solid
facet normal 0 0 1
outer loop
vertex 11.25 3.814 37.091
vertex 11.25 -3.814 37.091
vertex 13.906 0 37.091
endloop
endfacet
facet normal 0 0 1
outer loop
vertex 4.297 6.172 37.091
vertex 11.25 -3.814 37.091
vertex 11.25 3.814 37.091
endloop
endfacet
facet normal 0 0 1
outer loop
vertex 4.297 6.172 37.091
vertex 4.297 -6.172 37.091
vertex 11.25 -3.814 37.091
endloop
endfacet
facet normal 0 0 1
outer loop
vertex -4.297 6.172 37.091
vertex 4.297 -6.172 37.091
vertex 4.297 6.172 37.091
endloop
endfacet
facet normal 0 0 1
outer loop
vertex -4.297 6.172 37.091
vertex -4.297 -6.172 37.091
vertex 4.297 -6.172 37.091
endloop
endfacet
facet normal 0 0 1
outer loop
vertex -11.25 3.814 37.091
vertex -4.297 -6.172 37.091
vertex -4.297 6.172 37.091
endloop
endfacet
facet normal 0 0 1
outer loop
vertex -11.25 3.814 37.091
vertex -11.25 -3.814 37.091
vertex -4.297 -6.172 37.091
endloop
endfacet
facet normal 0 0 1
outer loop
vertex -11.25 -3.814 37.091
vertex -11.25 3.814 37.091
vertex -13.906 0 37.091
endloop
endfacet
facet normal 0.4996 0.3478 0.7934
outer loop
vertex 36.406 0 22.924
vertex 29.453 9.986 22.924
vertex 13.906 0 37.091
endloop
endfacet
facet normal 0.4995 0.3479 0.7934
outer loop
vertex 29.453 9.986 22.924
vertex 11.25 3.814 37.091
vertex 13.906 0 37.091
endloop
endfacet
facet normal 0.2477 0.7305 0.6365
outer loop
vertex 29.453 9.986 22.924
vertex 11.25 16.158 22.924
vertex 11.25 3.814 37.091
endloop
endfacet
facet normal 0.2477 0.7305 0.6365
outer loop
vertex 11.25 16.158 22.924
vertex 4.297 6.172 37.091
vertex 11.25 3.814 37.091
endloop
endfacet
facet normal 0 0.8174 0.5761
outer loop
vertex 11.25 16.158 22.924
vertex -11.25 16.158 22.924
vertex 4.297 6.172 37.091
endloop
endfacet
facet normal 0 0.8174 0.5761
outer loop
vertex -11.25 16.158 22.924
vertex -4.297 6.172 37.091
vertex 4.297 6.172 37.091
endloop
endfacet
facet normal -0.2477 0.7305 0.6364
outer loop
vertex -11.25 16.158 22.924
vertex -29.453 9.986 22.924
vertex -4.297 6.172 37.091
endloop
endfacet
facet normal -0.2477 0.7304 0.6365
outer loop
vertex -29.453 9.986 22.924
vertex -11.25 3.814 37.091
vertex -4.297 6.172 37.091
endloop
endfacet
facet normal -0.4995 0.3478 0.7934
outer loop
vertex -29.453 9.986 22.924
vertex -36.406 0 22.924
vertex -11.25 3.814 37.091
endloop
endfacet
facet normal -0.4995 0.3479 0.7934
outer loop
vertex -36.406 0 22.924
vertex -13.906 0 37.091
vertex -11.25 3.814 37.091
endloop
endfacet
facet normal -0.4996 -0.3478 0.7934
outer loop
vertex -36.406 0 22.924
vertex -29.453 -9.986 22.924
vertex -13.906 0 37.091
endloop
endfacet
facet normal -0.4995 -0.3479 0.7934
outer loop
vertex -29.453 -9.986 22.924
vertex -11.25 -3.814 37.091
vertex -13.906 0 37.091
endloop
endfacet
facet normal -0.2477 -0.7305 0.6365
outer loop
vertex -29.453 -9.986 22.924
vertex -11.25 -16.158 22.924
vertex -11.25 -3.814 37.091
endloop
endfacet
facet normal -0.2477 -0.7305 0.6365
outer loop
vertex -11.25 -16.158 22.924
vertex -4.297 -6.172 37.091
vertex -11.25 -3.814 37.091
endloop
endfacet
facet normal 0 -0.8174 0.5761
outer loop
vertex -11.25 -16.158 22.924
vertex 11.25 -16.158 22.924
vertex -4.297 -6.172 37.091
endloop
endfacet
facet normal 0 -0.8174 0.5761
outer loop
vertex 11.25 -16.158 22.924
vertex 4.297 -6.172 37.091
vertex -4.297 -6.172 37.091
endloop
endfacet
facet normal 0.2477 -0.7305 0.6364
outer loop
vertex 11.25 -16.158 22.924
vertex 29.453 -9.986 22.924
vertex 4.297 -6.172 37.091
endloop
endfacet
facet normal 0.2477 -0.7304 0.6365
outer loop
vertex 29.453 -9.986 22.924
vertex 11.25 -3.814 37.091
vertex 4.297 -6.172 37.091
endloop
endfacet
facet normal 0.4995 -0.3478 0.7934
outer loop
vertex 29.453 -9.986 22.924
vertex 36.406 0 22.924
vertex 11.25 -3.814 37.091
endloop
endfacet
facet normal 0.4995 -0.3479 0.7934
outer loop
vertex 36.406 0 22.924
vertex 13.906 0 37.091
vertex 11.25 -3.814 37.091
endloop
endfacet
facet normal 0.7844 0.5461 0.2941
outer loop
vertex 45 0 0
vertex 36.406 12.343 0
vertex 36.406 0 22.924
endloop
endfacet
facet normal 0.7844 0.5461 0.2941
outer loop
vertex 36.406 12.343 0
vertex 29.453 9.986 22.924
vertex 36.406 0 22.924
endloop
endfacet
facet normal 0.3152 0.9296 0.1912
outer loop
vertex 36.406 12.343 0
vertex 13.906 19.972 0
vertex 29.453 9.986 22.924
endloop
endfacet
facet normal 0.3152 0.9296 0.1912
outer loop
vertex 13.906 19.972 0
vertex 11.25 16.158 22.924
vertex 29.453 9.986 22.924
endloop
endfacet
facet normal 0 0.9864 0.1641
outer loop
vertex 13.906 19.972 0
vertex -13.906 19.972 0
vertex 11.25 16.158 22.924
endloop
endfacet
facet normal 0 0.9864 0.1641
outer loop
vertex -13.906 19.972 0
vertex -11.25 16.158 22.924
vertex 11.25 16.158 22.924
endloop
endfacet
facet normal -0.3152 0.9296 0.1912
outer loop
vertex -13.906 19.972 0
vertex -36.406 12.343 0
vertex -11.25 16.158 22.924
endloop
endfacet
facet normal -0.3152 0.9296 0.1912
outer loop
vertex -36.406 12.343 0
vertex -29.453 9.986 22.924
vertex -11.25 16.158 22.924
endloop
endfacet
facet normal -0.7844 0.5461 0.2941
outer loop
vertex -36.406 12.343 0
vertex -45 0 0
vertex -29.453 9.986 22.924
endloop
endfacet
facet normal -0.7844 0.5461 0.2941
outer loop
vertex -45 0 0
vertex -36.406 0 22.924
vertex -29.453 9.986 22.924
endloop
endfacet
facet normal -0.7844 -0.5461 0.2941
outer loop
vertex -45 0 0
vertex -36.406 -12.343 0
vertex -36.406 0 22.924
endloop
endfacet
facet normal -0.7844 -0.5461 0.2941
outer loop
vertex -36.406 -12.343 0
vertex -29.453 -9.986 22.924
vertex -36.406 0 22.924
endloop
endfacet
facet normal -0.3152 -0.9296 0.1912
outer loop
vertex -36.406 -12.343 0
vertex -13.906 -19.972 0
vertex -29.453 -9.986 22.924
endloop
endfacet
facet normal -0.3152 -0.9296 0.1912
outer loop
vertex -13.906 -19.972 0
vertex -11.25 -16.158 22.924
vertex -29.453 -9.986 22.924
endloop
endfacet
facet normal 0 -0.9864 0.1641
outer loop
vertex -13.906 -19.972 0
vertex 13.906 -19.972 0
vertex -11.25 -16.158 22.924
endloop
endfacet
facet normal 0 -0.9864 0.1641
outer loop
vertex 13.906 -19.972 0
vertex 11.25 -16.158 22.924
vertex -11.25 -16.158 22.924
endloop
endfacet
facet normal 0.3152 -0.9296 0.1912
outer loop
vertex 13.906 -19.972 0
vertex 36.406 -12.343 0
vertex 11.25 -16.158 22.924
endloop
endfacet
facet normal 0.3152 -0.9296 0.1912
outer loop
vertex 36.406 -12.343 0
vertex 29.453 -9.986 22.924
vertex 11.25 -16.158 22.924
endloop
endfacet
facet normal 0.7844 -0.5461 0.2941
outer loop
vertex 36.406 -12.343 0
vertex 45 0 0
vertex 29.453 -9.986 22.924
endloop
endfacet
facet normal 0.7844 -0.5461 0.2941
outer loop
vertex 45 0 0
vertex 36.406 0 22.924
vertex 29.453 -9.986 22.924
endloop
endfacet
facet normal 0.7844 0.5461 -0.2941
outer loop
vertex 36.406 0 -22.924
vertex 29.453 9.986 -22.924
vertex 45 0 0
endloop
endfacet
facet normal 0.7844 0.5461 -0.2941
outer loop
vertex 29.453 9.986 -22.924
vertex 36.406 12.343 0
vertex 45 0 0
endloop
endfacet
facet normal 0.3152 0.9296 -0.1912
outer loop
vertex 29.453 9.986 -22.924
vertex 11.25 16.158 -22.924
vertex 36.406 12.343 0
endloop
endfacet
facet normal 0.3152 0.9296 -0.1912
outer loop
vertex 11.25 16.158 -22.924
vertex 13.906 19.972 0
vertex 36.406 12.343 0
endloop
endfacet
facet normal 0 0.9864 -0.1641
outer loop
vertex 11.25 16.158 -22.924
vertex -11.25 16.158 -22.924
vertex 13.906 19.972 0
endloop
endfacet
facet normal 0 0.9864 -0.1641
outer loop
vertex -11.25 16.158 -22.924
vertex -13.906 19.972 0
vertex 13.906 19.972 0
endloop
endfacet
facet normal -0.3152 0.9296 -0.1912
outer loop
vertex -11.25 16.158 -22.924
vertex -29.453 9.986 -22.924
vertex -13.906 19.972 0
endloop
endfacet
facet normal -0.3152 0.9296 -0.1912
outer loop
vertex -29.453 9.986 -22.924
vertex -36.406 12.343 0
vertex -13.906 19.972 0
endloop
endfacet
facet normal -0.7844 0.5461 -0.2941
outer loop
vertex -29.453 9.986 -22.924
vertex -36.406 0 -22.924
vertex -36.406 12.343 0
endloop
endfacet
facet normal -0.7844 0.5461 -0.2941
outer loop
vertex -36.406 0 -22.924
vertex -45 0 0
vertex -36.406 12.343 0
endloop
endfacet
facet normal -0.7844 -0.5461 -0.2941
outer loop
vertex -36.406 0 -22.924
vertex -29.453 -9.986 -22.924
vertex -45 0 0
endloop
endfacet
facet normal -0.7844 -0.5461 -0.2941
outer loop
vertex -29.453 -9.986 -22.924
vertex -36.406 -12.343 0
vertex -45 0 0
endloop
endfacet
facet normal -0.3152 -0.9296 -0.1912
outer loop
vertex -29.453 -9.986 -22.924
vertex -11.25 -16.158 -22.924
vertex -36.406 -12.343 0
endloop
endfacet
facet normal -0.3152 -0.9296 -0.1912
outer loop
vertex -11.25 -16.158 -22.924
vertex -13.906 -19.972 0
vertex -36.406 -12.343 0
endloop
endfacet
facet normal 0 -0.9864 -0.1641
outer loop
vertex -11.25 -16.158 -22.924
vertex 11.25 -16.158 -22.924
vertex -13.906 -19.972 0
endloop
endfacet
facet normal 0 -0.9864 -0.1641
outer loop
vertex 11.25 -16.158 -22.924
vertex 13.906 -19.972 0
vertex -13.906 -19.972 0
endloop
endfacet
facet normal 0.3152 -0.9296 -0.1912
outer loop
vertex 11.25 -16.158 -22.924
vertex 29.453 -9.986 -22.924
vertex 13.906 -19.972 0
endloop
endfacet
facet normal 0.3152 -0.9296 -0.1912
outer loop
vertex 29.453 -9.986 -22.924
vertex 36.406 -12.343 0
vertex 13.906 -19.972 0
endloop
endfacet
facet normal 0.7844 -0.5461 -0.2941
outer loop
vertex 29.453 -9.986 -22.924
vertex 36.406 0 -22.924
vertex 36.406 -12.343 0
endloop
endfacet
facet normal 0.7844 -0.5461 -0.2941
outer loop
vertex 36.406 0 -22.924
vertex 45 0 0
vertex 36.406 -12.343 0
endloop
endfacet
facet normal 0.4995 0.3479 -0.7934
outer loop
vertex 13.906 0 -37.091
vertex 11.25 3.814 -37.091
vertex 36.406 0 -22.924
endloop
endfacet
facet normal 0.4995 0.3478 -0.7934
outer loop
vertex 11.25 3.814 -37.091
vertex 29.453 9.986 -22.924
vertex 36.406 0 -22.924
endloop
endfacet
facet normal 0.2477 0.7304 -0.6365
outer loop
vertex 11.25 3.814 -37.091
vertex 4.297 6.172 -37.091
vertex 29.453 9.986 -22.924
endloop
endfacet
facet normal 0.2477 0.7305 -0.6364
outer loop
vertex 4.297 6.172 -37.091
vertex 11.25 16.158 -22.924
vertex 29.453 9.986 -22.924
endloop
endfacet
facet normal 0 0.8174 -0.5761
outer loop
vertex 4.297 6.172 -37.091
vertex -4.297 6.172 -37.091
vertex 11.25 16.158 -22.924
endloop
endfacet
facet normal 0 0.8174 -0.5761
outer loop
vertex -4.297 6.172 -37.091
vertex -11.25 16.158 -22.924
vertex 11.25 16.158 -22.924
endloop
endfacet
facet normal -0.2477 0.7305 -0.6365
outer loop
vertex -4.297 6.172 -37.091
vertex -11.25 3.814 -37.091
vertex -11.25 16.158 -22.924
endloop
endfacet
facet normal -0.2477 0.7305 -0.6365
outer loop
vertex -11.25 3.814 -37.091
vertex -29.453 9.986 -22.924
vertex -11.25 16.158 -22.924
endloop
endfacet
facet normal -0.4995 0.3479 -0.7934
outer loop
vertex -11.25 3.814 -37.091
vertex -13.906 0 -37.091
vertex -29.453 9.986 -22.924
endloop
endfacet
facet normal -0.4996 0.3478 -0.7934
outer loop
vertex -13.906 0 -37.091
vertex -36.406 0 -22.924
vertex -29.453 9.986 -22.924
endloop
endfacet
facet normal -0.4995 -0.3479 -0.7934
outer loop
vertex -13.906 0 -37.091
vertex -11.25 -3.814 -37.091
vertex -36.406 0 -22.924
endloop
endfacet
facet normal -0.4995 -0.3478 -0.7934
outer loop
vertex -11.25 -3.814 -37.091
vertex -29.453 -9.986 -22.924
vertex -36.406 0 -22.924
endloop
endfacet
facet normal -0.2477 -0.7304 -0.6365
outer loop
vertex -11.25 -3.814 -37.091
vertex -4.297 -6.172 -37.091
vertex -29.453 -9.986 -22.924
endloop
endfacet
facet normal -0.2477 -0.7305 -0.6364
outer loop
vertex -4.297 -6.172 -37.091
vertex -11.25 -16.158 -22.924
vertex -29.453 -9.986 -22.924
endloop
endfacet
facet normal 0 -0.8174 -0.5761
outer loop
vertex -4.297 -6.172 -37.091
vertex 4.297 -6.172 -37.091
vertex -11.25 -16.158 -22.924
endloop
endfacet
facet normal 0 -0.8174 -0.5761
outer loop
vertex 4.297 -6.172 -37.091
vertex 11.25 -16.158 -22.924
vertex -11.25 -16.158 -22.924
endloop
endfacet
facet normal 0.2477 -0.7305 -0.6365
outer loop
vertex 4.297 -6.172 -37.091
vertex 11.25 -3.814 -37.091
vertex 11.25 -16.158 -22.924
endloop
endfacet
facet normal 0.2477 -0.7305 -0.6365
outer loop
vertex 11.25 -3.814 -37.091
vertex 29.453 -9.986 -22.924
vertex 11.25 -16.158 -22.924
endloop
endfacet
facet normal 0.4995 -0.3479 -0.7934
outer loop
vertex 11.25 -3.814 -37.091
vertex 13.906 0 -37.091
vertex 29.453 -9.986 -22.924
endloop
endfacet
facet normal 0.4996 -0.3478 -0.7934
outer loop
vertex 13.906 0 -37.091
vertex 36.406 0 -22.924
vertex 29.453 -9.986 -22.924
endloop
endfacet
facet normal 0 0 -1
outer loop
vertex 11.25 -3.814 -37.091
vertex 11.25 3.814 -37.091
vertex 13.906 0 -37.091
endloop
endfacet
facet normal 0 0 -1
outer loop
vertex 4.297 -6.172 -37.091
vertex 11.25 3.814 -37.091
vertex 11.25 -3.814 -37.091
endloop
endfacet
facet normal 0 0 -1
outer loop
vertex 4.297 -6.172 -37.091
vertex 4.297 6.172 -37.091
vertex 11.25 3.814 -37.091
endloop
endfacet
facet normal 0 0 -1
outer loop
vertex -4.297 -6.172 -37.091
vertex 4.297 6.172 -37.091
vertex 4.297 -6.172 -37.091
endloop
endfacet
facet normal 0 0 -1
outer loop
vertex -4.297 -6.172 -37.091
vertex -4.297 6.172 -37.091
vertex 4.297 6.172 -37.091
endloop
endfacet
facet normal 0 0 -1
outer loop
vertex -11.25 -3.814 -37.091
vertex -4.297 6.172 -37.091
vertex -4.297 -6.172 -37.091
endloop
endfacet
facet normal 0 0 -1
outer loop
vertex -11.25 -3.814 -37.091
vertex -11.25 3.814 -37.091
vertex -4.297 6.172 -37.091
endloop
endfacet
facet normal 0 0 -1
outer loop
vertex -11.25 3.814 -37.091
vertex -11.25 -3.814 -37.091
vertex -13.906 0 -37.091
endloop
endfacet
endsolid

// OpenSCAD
// Generated by SolidPython 1.0.1 on 2020-07-29 00:46:51


scale(v = [15, 7, 13]) {
	sphere(r = 3);
}
/***********************************************
*********      SolidPython code:      **********
************************************************
 
# import packages: SolidPython
from solid import *
from solid.utils import *
from itertools import chain, combinations, permutations


class Resize:

    def __init__(self, scad_file):
        self.scad_file = scad_file
        #self.scad_file = import_scad(scad_file)
        # cone/cylinder param:
        self.r1 = 0
        self.r2 = 0
        self.h = 0
        # rectangular prism param:
        self.w = 0
        self.l = 0
        # ellipse param:
        self.r = 0

    # import OpenScad code (file name corresponds to shape)


    # classify shape + parameters
    def assign(self, param1, param2, param3):
        if self.scad_file == 'cone.scad':
            self.r1 = param1
            self.r2 = param2
            self.h = param3
        elif self.scad_file == 'cylinder.scad':
            self.r1 = param1
            self.r2 = param2
            self.h = param3
        elif self.scad_file == 'rectangularPrism.scad':
            self.h = param1
            self.l = param2
            self.w = param3
        else:
            self.r = param1
            self.h = param2

    # resize parameters
    def iterate(self):
        x = range(3, 20, 2)
        i = 1
        if self.scad_file == 'cone.scad':
            tempList = list(permutations(x, 2))
            for temp in tempList:
                param1 = temp[0]
                param2 = temp[1]
                filepath = 'produced_scad_files/' + 'cone' + str(param1) + '_' + str(param2) + '_' + '.scad'
                scad_render_to_file(cylinder(h=param1, r1=param2, r2=0), filepath)

        elif self.scad_file == 'cylinder.scad':
            tempList = list(permutations(x, 3))
            for temp in tempList:
                param1 = temp[0]
                param2 = temp[1]
                filepath = 'produced_scad_files/' + 'cylinder' + str(param1) + '_' + str(param2) + '_' + '.scad'
                scad_render_to_file(cylinder(h=param1, r1=param2, r2=param2), filepath)

        elif self.scad_file == 'rectangularPrism.scad':
            tempList = list(permutations(x, 3))
            for temp in tempList:
                param1 = temp[0]
                param2 = temp[1]
                param3 = temp[2]
                filepath = 'produced_scad_files/' + 'rectangularPrism' + str(param1) + '_' + str(param2) + '_' + str(
                    param3) + '.scad'
                scad_render_to_file(cube(size=(param1, param2, param3)), filepath)

        elif self.scad_file == 'ellipse.scad':
            tempList = list(permutations(x, 4))
            for temp in tempList:
                param1 = temp[0]
                param2 = temp[1]
                param3 = temp[2]
                param4 = temp[3]
                filepath = 'produced_scad_files/' + 'ellipse' + str(param1) + '_' + str(param2) + '_' + str(param3) + '_' + str(param4) + '.scad'
                scad_render_to_file(scale([param1, param2, param3])(sphere(r=param4)), filepath)

    def render_to_scadfile(self):
        scad_render_to_file(scad, 'example.scad') 
 
************************************************/
